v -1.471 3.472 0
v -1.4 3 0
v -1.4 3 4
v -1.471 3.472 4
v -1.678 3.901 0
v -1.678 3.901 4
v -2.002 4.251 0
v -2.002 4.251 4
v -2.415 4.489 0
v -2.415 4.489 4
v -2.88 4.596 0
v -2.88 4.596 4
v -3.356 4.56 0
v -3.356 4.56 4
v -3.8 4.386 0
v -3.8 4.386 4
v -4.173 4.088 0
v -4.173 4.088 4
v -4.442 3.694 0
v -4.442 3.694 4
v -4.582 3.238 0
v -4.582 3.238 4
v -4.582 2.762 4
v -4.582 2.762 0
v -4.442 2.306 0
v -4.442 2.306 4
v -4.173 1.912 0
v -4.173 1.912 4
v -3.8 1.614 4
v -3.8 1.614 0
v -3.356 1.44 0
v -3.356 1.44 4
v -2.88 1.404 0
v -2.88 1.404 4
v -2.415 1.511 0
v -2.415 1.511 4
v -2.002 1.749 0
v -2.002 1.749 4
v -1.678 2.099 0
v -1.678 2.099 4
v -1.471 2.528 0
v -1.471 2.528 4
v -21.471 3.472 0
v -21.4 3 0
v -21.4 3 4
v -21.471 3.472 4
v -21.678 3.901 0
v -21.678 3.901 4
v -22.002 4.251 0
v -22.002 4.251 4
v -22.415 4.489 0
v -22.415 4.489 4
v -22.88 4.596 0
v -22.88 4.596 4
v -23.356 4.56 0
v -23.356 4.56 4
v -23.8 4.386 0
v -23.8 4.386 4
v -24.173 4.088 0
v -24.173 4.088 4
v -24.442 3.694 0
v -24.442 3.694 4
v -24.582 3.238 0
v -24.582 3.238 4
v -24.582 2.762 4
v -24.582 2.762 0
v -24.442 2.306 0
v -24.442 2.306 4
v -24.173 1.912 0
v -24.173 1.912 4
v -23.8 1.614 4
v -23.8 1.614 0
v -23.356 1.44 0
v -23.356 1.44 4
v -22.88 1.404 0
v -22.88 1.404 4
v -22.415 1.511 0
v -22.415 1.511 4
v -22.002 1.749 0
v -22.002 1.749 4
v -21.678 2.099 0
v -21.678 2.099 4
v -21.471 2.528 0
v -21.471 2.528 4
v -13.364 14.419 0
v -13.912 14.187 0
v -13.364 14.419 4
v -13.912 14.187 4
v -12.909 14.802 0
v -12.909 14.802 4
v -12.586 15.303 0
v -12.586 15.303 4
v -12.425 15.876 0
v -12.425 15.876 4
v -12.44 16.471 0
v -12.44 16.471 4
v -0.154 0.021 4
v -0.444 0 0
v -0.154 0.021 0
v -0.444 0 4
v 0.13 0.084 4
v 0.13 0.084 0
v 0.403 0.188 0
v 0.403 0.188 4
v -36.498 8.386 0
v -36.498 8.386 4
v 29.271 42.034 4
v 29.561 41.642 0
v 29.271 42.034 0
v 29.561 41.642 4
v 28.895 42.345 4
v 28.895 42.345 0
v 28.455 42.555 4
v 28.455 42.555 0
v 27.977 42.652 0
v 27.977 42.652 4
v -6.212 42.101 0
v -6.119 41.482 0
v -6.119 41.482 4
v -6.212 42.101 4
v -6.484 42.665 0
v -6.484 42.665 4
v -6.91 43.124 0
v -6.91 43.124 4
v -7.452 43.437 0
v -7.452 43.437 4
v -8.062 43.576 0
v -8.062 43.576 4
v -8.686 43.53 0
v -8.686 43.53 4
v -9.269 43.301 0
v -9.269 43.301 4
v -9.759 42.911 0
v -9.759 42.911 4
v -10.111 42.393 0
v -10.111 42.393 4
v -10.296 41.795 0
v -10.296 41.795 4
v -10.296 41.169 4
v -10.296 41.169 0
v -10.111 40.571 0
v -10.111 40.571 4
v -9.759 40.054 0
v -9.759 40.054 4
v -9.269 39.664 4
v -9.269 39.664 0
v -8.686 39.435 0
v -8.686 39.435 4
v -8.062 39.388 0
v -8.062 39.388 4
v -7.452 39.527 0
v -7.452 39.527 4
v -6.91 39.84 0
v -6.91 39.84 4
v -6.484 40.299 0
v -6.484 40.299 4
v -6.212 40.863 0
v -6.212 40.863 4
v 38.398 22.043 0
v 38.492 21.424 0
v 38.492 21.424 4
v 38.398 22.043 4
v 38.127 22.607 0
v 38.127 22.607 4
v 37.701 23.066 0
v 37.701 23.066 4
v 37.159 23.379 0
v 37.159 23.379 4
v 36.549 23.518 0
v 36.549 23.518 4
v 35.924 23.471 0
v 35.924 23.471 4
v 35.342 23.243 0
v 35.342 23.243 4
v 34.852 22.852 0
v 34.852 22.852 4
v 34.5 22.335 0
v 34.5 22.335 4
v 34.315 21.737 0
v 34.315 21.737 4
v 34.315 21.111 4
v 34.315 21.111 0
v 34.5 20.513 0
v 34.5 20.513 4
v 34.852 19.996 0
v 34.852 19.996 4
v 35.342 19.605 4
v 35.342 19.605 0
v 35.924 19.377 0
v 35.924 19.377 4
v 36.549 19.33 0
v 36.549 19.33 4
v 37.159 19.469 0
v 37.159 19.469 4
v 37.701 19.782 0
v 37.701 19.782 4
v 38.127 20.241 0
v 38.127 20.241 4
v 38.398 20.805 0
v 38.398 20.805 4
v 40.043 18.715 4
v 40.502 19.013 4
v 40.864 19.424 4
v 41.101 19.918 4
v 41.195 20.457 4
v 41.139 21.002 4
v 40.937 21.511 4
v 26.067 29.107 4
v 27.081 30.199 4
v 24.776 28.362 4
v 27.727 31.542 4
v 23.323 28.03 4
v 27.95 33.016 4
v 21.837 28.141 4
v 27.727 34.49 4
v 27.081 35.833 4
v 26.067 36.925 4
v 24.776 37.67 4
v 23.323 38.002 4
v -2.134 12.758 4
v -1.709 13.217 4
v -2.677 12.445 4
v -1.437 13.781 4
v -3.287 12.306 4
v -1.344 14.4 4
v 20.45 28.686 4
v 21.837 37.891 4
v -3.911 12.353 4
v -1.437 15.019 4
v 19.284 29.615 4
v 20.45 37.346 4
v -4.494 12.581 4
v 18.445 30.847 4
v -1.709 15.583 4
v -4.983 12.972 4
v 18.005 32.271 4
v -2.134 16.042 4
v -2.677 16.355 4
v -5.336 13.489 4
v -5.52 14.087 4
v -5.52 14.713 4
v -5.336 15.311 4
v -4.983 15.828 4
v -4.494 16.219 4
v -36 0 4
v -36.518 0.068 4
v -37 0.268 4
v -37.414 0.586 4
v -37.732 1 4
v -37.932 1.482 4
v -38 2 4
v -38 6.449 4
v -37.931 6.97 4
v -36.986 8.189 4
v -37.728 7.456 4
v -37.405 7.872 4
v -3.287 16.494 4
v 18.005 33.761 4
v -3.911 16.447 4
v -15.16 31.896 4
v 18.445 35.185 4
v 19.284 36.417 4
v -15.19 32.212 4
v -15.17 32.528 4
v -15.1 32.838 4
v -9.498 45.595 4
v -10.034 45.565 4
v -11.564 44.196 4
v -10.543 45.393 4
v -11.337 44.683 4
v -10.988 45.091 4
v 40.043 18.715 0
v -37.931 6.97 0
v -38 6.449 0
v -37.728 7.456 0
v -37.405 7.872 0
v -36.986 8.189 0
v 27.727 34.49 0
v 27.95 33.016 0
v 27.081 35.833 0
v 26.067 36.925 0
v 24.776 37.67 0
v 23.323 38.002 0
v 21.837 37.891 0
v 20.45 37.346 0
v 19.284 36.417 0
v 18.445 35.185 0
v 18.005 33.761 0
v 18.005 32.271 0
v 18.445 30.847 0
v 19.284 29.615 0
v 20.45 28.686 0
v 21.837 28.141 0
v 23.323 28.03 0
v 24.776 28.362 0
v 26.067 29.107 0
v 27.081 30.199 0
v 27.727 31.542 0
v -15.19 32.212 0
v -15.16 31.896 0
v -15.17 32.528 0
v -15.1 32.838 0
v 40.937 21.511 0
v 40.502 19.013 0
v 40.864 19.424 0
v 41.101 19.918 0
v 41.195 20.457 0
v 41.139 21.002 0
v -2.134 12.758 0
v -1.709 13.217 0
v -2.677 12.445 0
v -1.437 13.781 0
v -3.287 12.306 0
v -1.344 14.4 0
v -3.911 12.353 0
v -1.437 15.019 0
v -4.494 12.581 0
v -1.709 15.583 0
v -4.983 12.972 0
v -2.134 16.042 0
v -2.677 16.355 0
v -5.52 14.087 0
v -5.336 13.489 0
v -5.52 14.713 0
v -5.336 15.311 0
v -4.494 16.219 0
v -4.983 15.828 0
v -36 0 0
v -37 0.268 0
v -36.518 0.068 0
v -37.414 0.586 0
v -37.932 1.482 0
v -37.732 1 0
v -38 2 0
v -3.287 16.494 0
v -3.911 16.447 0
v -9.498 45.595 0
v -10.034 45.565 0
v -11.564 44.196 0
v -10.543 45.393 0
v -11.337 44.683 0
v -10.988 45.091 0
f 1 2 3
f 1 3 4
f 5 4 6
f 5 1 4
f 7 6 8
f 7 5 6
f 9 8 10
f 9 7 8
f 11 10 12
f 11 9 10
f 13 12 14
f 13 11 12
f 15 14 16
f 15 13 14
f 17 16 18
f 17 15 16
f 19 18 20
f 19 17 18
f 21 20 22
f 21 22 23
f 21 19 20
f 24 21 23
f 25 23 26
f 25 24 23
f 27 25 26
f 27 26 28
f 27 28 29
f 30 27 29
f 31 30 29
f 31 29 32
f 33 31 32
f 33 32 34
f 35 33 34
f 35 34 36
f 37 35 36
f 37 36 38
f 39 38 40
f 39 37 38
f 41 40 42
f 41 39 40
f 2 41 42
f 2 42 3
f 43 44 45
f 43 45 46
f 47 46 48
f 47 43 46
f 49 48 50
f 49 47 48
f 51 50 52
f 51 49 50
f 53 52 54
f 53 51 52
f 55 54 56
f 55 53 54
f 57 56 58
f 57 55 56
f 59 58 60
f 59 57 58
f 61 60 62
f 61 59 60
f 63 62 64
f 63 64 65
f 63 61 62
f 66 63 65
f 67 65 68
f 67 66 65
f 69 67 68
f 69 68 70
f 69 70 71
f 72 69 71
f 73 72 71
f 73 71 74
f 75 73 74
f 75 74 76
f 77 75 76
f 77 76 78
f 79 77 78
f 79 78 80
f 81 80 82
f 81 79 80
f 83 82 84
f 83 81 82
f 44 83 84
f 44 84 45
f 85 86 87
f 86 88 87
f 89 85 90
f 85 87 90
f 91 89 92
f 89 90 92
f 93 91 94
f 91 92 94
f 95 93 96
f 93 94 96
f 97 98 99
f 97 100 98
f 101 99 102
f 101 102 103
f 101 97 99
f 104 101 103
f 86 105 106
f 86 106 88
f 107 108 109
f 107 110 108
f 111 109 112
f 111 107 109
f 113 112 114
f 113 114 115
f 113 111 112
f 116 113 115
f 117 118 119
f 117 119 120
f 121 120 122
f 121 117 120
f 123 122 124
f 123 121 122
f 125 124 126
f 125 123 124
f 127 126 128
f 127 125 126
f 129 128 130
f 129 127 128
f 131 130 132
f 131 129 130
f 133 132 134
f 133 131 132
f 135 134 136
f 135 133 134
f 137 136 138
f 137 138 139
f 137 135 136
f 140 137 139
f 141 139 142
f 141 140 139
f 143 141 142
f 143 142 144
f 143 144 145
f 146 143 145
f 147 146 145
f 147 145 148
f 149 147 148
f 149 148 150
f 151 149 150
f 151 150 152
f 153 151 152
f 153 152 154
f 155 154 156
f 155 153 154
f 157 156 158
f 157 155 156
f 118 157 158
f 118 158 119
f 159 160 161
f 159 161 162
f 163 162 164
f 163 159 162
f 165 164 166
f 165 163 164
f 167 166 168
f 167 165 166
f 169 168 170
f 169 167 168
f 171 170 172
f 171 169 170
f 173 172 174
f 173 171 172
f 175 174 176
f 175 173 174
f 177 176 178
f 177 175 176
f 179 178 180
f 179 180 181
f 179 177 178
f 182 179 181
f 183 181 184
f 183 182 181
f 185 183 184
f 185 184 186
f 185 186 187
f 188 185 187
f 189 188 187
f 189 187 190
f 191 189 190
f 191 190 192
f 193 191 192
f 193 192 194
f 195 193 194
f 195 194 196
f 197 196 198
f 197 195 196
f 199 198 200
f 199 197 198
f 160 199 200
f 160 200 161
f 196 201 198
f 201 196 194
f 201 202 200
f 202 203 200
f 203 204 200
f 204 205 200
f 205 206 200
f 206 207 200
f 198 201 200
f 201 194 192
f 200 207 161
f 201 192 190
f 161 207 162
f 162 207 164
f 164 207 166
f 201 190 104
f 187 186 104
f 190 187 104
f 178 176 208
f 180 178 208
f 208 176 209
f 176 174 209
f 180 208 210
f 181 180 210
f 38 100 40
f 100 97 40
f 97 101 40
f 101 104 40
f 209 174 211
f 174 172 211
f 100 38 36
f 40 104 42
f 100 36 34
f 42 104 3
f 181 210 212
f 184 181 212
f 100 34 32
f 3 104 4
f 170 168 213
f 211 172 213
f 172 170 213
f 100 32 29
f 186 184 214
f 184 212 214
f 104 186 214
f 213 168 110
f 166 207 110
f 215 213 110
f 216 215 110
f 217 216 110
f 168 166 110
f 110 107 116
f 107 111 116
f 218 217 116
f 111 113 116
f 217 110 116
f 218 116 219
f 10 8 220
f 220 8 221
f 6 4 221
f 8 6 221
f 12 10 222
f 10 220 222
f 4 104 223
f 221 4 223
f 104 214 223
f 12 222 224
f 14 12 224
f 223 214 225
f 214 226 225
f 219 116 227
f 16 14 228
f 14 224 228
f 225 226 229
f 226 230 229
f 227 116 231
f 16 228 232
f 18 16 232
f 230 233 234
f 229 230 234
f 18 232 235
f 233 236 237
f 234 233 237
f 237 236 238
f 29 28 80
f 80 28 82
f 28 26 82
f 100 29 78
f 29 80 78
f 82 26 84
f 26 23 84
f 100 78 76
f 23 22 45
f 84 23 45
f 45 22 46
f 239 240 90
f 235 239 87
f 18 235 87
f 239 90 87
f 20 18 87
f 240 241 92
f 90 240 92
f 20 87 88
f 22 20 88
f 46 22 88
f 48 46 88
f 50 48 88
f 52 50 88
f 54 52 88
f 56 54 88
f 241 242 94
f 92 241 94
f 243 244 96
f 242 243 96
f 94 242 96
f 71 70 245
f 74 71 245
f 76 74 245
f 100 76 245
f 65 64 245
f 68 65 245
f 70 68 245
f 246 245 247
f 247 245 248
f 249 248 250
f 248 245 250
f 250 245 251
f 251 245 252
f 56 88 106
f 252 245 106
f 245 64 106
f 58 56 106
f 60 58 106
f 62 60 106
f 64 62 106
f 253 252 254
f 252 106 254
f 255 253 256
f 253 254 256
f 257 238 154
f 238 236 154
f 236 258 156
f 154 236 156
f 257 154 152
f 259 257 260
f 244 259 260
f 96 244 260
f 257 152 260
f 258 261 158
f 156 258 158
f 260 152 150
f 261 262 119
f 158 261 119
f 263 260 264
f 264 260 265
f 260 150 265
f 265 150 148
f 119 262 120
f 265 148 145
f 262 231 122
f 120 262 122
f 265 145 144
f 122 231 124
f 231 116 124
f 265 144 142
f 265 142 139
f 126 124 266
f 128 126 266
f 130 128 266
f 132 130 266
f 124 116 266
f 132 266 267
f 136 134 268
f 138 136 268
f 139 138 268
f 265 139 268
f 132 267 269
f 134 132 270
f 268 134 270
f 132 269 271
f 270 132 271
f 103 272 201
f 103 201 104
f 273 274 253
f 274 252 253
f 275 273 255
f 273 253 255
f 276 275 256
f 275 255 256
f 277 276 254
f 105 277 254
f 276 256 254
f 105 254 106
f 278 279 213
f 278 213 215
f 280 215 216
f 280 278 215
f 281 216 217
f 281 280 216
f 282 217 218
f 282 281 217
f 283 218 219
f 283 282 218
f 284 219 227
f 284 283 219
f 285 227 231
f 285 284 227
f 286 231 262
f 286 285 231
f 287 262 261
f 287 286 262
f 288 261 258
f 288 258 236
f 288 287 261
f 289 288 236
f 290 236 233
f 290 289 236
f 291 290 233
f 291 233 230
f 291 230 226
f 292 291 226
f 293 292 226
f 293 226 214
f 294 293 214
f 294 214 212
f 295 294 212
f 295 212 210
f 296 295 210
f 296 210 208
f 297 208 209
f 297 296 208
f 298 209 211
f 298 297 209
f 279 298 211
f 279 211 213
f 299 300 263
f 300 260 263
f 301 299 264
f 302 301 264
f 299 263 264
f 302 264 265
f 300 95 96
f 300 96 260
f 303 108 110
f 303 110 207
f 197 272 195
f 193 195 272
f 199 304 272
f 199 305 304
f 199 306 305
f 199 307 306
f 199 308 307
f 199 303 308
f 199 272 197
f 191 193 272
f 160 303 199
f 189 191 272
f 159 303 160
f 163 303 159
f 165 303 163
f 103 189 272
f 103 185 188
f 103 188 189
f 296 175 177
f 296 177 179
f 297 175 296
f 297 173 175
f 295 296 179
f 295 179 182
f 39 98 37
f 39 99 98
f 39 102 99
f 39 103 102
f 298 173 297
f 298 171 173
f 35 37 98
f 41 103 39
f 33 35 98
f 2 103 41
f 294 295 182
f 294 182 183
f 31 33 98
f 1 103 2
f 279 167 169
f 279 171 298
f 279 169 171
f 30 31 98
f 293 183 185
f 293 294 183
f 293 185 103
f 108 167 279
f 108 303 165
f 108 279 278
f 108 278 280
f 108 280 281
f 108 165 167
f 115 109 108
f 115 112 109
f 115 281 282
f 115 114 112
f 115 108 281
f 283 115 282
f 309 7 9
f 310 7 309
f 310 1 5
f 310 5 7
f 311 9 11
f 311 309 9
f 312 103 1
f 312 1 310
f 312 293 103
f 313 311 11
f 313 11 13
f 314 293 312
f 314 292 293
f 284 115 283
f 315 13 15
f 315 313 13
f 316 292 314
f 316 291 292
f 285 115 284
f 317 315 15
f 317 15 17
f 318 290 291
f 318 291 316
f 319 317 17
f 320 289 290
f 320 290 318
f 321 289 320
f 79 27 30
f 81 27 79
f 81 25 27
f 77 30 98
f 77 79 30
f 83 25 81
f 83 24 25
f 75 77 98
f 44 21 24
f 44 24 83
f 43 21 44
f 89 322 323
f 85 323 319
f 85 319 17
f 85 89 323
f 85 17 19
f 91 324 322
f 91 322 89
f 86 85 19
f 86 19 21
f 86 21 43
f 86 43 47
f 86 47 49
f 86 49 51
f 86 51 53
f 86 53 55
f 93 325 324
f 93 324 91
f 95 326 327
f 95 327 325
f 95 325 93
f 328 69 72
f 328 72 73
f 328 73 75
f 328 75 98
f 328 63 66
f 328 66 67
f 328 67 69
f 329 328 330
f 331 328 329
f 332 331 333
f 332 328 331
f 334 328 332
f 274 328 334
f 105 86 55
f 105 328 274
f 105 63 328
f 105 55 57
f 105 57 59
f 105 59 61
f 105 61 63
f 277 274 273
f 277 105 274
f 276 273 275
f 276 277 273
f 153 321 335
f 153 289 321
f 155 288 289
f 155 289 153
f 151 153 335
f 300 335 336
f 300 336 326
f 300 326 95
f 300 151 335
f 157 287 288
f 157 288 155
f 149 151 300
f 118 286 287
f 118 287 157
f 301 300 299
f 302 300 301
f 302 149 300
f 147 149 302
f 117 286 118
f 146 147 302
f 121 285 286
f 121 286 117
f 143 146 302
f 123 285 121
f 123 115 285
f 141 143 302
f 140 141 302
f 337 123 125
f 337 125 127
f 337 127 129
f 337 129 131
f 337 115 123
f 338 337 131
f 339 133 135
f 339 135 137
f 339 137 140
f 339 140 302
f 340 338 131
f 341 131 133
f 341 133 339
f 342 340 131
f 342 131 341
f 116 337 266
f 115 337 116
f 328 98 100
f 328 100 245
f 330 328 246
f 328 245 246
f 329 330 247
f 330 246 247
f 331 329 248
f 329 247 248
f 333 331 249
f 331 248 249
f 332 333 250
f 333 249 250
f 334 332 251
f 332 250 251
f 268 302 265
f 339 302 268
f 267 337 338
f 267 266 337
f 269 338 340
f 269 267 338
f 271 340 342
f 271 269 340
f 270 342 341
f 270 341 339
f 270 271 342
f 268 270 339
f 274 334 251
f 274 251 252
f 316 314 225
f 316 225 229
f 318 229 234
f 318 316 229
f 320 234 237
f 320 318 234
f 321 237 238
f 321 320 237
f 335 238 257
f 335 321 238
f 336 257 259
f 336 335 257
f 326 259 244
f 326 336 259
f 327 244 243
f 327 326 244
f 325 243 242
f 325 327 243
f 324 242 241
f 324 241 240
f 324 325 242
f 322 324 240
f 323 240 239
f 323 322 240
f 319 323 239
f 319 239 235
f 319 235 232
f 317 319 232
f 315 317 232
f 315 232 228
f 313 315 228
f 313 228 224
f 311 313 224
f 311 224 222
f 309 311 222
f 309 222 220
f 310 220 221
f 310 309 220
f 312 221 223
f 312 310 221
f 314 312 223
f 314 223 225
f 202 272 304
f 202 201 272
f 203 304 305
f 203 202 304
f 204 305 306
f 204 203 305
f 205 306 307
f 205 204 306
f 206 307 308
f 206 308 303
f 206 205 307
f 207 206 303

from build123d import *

# Parameters (mm, degrees)
SKETCH1_R           = 2.1
SKETCH1_R_2         = 5
SKETCH1_R_3         = 1.6
BOSS_EXTRUDE1_DEPTH = 4
FILLET1_R           = 2


with BuildPart() as part:
    # Sketch1 → Boss-Extrude1 (new body)
    with BuildSketch(Plane.XY):
        Polygon((0, 0), (-38, 0), (-38, 8), (-12.118525594, 14.647404058), (-15.244192792, 32.373943612), (-11.089131581, 45.719920845), (29.037661116, 42.568648925), (42, 19.629949763), align=None)
        with Locations((-8.219100268, 41.482213208)):
            Circle(SKETCH1_R, mode=Mode.SUBTRACT)
        with Locations((-3.443775383, 14.4)):
            Circle(SKETCH1_R, mode=Mode.SUBTRACT)
        with Locations((36.391698227, 21.424068787)):
            Circle(SKETCH1_R, mode=Mode.SUBTRACT)
        with Locations((22.949568756, 33.015974596)):
            Circle(SKETCH1_R_2, mode=Mode.SUBTRACT)
        with Locations((-23, 3)):
            Circle(SKETCH1_R_3, mode=Mode.SUBTRACT)
        with Locations((-3, 3)):
            Circle(SKETCH1_R_3, mode=Mode.SUBTRACT)
    extrude(amount=BOSS_EXTRUDE1_DEPTH)

    # Fillet1
    fillet1_edges = [part.edges().sort_by_distance(p)[0] for p in [
        (0, 0, 2),
        (-38, 0, 2),
        (-38, 8, 2),
        (-12.118525594, 14.647404058, 2),
        (-15.244192792, 32.373943612, 2),
        (-11.089131581, 45.719920845, 2),
        (29.037661116, 42.568648925, 2),
        (42, 19.629949763, 2),
    ]]
    fillet(fillet1_edges, radius=FILLET1_R)


solid = part.part
